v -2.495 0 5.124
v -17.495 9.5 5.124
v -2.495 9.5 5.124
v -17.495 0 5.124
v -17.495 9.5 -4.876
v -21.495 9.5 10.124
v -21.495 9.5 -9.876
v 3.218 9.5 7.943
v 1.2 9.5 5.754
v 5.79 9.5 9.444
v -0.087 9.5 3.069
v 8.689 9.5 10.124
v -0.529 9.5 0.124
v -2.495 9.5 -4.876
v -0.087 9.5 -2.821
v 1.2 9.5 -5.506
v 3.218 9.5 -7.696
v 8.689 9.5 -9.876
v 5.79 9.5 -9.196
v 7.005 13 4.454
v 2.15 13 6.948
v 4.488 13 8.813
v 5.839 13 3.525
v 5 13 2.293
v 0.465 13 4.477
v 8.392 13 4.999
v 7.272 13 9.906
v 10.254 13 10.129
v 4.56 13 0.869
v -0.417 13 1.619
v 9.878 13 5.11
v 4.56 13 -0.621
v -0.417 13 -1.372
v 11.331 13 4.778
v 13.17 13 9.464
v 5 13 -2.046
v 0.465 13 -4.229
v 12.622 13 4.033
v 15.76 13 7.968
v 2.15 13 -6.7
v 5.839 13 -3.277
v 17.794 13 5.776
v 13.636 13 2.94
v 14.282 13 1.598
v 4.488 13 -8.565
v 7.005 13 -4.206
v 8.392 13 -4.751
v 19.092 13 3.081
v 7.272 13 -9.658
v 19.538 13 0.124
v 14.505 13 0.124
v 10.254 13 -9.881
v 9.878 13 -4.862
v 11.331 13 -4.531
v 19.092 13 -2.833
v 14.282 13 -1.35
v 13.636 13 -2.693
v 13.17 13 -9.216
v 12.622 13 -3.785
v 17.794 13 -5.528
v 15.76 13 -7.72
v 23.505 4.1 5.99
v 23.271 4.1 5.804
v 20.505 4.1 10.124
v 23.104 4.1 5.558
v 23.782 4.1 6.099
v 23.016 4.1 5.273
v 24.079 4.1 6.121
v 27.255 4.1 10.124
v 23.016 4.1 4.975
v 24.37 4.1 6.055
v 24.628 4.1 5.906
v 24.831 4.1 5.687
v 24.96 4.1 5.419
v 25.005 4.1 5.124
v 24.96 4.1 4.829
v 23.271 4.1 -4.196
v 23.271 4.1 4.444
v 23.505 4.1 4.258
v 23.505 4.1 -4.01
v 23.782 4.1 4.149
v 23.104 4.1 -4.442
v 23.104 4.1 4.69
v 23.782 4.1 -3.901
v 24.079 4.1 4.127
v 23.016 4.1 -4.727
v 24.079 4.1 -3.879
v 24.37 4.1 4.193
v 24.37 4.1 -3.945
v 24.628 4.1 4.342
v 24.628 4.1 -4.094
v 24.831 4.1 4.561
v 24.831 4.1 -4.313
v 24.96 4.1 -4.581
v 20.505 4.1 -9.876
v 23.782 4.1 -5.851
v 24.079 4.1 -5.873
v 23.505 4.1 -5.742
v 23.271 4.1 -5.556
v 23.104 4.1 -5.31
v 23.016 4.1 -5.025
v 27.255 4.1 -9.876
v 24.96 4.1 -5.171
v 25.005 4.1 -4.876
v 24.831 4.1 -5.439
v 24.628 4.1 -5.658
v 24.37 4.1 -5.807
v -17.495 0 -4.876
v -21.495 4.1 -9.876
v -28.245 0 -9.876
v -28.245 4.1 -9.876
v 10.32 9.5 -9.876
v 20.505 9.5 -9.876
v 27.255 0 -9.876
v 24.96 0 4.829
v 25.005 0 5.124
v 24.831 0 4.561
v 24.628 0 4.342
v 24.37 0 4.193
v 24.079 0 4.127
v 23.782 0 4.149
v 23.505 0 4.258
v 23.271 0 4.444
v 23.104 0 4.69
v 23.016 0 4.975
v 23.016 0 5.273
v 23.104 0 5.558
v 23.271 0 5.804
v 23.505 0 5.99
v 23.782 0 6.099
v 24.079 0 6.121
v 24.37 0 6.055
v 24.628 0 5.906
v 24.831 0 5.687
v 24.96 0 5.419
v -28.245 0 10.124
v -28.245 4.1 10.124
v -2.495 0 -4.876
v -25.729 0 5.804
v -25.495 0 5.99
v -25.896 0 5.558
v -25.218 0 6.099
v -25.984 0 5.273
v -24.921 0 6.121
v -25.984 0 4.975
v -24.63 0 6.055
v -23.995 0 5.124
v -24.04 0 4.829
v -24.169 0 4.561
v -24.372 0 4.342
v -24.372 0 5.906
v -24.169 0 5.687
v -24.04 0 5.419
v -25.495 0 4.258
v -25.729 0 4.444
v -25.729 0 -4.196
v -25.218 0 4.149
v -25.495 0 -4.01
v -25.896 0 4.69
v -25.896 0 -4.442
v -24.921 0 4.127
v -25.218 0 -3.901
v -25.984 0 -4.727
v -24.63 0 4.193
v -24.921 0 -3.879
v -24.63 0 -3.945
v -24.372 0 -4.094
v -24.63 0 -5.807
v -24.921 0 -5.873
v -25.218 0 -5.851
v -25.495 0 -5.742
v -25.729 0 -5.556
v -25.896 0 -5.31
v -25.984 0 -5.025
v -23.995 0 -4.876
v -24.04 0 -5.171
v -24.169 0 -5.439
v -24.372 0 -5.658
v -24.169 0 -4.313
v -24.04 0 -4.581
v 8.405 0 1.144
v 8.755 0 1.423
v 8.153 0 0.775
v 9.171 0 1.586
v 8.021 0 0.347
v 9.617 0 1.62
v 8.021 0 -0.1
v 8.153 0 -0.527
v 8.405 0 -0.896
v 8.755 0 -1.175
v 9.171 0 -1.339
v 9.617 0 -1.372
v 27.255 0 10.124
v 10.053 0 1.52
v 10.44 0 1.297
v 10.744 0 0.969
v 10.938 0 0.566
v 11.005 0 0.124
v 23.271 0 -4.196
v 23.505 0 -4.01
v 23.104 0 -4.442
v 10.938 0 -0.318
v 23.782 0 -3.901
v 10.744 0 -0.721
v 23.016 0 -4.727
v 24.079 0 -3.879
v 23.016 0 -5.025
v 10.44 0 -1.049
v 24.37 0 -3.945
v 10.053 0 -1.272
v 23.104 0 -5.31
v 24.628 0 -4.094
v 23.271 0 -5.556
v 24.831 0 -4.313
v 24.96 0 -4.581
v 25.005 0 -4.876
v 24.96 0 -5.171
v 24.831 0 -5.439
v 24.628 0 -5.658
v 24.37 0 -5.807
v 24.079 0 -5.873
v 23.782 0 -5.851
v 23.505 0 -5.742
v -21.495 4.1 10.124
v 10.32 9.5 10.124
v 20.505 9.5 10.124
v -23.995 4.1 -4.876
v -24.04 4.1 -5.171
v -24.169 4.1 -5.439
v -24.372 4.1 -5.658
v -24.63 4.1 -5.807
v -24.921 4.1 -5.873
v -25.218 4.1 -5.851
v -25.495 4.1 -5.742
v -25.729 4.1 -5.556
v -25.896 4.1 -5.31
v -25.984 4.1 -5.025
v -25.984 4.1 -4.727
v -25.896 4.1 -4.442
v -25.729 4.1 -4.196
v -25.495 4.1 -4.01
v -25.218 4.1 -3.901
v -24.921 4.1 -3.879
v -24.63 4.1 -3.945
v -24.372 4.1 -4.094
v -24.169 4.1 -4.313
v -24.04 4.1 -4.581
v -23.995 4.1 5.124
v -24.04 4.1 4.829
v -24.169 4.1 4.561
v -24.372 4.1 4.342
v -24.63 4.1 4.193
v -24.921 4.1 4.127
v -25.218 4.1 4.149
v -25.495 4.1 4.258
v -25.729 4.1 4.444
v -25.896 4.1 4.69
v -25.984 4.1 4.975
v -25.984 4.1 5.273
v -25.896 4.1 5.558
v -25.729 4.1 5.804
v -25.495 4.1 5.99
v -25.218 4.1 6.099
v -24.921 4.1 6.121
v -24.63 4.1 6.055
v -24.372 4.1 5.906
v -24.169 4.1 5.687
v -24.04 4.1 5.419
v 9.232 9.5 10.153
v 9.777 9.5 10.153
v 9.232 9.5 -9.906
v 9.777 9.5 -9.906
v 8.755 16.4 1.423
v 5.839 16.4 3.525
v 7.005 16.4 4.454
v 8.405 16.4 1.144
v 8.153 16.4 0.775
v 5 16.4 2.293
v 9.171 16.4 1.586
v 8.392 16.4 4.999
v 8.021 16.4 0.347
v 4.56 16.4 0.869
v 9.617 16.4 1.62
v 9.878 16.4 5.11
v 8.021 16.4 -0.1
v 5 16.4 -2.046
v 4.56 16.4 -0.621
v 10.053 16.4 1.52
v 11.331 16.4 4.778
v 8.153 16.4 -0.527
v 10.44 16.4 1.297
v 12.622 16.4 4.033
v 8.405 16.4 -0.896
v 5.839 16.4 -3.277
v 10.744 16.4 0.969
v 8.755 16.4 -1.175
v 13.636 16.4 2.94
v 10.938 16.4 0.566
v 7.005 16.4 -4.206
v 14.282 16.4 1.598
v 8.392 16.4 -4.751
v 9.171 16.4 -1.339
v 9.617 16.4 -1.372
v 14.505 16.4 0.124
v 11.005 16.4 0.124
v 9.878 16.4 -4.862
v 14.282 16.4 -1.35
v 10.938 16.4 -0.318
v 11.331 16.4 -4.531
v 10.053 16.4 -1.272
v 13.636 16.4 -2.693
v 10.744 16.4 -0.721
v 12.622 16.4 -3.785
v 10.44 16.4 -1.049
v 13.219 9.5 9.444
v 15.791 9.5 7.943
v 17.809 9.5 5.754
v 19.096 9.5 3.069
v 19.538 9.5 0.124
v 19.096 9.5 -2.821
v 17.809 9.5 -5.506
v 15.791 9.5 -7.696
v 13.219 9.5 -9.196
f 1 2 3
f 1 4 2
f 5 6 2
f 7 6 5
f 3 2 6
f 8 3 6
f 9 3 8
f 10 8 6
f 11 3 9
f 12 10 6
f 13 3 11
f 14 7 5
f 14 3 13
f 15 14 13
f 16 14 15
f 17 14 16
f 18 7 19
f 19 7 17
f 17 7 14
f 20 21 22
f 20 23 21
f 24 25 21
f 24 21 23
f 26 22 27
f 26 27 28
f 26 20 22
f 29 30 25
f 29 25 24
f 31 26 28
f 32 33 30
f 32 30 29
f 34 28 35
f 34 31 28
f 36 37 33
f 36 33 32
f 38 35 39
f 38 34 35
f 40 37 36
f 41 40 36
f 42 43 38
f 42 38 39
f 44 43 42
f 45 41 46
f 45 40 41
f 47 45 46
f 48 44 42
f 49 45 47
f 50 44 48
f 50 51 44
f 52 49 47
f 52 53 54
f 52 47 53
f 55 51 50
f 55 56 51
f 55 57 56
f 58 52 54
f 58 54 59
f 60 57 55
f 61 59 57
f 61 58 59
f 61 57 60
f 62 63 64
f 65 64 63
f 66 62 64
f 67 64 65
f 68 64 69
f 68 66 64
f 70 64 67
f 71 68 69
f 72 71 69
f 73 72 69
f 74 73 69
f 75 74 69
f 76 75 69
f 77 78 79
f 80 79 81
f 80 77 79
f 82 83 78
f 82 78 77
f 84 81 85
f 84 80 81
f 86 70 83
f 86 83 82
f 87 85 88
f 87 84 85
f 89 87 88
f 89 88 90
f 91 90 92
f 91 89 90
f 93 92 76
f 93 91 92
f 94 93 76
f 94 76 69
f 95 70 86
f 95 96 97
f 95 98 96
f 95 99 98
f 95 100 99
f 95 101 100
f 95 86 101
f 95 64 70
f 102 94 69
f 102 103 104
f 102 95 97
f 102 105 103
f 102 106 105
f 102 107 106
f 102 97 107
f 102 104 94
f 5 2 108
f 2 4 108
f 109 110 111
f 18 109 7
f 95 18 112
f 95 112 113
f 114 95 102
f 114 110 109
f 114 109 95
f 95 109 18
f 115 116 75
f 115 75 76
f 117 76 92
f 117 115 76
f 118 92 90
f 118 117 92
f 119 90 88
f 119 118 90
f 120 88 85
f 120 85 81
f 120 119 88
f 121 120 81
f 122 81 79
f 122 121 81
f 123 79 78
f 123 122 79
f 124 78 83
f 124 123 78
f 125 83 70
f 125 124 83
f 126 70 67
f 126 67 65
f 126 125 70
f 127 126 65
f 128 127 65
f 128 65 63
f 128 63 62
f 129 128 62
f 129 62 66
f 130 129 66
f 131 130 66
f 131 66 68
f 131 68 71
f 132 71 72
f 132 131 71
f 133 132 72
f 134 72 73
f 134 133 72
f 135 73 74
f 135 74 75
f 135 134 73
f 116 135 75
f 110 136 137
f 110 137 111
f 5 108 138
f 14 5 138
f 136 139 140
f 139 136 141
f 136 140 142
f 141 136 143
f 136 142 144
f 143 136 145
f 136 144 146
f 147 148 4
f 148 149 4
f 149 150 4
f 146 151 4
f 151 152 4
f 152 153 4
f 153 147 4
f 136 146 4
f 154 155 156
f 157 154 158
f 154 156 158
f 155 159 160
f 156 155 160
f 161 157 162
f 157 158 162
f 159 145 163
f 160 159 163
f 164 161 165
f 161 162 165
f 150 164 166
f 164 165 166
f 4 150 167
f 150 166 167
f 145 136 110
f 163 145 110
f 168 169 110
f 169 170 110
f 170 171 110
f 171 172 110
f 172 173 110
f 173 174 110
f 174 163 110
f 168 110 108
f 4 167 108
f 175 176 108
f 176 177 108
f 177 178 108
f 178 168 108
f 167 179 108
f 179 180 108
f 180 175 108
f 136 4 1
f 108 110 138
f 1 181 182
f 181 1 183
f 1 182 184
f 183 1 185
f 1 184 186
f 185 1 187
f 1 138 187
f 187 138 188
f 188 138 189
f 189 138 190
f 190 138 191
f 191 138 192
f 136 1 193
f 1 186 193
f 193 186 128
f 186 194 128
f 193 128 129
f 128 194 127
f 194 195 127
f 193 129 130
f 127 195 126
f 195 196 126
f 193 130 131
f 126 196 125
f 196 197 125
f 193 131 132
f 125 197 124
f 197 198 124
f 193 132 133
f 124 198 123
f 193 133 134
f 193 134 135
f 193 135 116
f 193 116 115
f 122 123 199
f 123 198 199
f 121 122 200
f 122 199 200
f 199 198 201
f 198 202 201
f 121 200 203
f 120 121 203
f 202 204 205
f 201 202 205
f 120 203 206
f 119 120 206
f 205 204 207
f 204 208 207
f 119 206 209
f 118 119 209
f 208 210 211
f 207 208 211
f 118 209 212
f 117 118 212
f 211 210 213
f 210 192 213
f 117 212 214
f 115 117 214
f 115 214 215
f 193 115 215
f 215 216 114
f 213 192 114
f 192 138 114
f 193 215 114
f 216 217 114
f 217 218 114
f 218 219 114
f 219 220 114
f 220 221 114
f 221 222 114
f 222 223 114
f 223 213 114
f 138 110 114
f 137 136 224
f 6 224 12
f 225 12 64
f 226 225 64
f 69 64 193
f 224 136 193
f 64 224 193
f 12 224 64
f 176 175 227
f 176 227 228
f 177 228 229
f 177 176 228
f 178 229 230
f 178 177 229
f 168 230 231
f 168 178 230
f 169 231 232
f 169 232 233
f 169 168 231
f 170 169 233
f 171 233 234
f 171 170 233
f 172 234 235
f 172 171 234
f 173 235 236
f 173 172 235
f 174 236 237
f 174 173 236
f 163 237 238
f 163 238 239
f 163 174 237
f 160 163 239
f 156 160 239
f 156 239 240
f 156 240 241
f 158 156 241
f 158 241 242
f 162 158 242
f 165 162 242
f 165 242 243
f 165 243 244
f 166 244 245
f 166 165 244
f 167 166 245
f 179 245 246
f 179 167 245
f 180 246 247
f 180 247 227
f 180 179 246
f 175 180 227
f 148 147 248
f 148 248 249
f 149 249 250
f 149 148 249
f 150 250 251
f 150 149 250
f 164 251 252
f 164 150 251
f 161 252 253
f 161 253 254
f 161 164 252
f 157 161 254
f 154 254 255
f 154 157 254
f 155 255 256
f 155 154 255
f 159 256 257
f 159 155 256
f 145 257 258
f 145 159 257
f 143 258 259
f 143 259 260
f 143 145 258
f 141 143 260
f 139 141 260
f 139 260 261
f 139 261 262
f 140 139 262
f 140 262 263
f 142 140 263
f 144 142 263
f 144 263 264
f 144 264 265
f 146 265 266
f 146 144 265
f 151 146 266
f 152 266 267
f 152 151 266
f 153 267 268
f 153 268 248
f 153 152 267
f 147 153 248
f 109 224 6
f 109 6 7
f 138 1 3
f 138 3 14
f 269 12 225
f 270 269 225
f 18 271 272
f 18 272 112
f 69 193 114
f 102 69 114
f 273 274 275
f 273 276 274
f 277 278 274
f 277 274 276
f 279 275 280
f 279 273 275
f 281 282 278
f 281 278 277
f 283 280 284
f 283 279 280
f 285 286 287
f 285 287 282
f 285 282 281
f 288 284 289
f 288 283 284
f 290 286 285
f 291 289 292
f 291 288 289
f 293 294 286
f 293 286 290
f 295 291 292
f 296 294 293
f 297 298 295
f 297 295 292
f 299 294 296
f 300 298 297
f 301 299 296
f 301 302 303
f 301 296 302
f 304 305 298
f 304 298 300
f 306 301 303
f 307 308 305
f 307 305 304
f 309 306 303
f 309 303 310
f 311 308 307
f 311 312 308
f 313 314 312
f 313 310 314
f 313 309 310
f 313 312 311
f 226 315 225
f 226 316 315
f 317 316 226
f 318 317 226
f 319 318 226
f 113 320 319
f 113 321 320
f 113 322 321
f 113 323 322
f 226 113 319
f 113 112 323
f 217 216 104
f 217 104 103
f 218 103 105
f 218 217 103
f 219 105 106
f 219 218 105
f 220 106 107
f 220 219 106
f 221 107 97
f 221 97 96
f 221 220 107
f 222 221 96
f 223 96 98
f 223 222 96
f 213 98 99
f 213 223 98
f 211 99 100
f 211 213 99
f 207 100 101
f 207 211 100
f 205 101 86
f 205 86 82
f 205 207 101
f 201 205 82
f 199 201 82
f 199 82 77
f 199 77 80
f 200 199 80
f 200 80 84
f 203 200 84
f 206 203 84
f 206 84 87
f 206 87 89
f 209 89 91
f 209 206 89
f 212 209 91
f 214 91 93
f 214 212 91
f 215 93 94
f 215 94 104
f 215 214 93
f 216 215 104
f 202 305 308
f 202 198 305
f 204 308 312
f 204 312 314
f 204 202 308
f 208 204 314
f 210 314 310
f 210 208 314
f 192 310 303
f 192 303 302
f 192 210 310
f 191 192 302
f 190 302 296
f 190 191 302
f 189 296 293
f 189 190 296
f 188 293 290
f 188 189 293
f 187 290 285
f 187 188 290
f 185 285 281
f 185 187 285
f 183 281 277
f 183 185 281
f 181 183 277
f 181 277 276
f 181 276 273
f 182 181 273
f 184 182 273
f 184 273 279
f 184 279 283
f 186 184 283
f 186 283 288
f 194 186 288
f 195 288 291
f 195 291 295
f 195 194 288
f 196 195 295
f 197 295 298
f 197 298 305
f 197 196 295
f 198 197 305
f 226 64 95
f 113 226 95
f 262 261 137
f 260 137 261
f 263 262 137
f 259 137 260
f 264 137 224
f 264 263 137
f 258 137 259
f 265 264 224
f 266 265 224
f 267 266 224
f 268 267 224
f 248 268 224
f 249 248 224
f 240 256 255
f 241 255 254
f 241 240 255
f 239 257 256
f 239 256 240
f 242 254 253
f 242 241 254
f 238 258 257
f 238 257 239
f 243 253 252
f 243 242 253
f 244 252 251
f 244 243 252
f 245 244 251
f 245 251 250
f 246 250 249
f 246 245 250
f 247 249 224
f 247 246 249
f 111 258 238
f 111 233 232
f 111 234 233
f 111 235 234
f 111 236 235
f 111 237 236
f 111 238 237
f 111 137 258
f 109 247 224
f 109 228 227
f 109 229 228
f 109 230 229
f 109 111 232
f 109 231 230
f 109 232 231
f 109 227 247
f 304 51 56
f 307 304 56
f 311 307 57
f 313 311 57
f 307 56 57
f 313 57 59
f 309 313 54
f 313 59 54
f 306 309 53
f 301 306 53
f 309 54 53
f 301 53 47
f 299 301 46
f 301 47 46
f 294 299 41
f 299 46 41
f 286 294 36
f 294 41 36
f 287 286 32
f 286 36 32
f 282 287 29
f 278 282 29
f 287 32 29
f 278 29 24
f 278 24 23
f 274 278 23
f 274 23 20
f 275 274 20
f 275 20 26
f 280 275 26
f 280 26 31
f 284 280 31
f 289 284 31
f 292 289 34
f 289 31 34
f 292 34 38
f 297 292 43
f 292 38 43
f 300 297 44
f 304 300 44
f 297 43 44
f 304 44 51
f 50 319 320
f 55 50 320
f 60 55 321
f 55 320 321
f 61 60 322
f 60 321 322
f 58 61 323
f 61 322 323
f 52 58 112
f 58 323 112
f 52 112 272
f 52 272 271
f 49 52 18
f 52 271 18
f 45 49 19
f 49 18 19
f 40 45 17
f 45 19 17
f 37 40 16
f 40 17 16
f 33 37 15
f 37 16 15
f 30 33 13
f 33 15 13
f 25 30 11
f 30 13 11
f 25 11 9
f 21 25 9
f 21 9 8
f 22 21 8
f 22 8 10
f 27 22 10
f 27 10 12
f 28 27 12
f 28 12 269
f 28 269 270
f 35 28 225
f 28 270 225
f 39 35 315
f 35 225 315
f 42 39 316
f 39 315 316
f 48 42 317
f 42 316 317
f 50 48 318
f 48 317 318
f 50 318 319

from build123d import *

# Parameters (mm, degrees)
CROQUIS1_W              = 55.5
CROQUIS1_H              = 20
CROQUIS1_R              = 1.000000224
CROQUIS1_R_2            = 1.000000066
CROQUIS1_R_3            = 1.500000028
CROQUIS1_R_4            = 0.999999891
CROQUIS1_R_5            = 0.999999587
CROQUIS1_W_2            = 15
CROQUIS1_H_2            = 10
SALIENTE_EXTRUIR1_DEPTH = 4.1
CROQUIS2_W              = 42
CROQUIS2_H              = 20
CROQUIS2_R              = 1.500000028
CROQUIS2_W_2            = 15
CROQUIS2_H_2            = 10
SALIENTE_EXTRUIR2_DEPTH = 5.4
CROQUIS3_R              = 10.033223334
CROQUIS3_R_2            = 1.500000028
SALIENTE_EXTRUIR3_DEPTH = 3.5
CROQUIS4_R              = 5
CROQUIS4_R_2            = 1.500000028
SALIENTE_EXTRUIR4_DEPTH = 3.4


with BuildPart() as part:
    # Croquis1 → Saliente-Extruir1 (new body)
    with BuildSketch(Plane(origin=(0, 0, 0), x_dir=(1, 0, 0), z_dir=(0, 1, 0))):
        with Locations((-0.49546198, -0.123865495)):
            Rectangle(CROQUIS1_W, CROQUIS1_H)
        with Locations((-24.995460911, 4.876134086)):
            Circle(CROQUIS1_R, mode=Mode.SUBTRACT)
        with Locations((-24.995461734, -5.123865495)):
            Circle(CROQUIS1_R_2, mode=Mode.SUBTRACT)
        with Locations((9.504538064, -0.123865505)):
            Circle(CROQUIS1_R_3, mode=Mode.SUBTRACT)
        with Locations((24.004538739, 4.876134747)):
            Circle(CROQUIS1_R_4, mode=Mode.SUBTRACT)
        with Locations((24.004537606, -5.123865416)):
            Circle(CROQUIS1_R_5, mode=Mode.SUBTRACT)
        with Locations((-9.99546198, -0.123865495)):
            Rectangle(CROQUIS1_W_2, CROQUIS1_H_2, mode=Mode.SUBTRACT)
    extrude(amount=SALIENTE_EXTRUIR1_DEPTH)

    # Croquis2 → Saliente-Extruir2 (add)
    with BuildSketch(Plane(origin=(0, 4.1, 0), x_dir=(1, 0, 0), z_dir=(0, 1, 0))):
        with Locations((-0.49546198, -0.123865495)):
            Rectangle(CROQUIS2_W, CROQUIS2_H)
        with Locations((9.504538064, -0.123865505)):
            Circle(CROQUIS2_R, mode=Mode.SUBTRACT)
        with Locations((-9.99546198, -0.123865495)):
            Rectangle(CROQUIS2_W_2, CROQUIS2_H_2, mode=Mode.SUBTRACT)
    extrude(amount=SALIENTE_EXTRUIR2_DEPTH)

    # Croquis3 → Saliente-Extruir3 (add)
    with BuildSketch(Plane(origin=(0, 9.5, 0), x_dir=(1, 0, 0), z_dir=(0, 1, 0))):
        with Locations((9.504538064, -0.123865505)):
            Circle(CROQUIS3_R)
        with Locations((9.504538064, -0.123865505)):
            Circle(CROQUIS3_R_2, mode=Mode.SUBTRACT)
    extrude(amount=SALIENTE_EXTRUIR3_DEPTH)

    # Croquis4 → Saliente-Extruir4 (add)
    with BuildSketch(Plane(origin=(0, 13, 0), x_dir=(1, 0, 0), z_dir=(0, 1, 0))):
        with Locations((9.504538064, -0.123865505)):
            Circle(CROQUIS4_R)
        with Locations((9.504538064, -0.123865505)):
            Circle(CROQUIS4_R_2, mode=Mode.SUBTRACT)
    extrude(amount=SALIENTE_EXTRUIR4_DEPTH)


solid = part.part
